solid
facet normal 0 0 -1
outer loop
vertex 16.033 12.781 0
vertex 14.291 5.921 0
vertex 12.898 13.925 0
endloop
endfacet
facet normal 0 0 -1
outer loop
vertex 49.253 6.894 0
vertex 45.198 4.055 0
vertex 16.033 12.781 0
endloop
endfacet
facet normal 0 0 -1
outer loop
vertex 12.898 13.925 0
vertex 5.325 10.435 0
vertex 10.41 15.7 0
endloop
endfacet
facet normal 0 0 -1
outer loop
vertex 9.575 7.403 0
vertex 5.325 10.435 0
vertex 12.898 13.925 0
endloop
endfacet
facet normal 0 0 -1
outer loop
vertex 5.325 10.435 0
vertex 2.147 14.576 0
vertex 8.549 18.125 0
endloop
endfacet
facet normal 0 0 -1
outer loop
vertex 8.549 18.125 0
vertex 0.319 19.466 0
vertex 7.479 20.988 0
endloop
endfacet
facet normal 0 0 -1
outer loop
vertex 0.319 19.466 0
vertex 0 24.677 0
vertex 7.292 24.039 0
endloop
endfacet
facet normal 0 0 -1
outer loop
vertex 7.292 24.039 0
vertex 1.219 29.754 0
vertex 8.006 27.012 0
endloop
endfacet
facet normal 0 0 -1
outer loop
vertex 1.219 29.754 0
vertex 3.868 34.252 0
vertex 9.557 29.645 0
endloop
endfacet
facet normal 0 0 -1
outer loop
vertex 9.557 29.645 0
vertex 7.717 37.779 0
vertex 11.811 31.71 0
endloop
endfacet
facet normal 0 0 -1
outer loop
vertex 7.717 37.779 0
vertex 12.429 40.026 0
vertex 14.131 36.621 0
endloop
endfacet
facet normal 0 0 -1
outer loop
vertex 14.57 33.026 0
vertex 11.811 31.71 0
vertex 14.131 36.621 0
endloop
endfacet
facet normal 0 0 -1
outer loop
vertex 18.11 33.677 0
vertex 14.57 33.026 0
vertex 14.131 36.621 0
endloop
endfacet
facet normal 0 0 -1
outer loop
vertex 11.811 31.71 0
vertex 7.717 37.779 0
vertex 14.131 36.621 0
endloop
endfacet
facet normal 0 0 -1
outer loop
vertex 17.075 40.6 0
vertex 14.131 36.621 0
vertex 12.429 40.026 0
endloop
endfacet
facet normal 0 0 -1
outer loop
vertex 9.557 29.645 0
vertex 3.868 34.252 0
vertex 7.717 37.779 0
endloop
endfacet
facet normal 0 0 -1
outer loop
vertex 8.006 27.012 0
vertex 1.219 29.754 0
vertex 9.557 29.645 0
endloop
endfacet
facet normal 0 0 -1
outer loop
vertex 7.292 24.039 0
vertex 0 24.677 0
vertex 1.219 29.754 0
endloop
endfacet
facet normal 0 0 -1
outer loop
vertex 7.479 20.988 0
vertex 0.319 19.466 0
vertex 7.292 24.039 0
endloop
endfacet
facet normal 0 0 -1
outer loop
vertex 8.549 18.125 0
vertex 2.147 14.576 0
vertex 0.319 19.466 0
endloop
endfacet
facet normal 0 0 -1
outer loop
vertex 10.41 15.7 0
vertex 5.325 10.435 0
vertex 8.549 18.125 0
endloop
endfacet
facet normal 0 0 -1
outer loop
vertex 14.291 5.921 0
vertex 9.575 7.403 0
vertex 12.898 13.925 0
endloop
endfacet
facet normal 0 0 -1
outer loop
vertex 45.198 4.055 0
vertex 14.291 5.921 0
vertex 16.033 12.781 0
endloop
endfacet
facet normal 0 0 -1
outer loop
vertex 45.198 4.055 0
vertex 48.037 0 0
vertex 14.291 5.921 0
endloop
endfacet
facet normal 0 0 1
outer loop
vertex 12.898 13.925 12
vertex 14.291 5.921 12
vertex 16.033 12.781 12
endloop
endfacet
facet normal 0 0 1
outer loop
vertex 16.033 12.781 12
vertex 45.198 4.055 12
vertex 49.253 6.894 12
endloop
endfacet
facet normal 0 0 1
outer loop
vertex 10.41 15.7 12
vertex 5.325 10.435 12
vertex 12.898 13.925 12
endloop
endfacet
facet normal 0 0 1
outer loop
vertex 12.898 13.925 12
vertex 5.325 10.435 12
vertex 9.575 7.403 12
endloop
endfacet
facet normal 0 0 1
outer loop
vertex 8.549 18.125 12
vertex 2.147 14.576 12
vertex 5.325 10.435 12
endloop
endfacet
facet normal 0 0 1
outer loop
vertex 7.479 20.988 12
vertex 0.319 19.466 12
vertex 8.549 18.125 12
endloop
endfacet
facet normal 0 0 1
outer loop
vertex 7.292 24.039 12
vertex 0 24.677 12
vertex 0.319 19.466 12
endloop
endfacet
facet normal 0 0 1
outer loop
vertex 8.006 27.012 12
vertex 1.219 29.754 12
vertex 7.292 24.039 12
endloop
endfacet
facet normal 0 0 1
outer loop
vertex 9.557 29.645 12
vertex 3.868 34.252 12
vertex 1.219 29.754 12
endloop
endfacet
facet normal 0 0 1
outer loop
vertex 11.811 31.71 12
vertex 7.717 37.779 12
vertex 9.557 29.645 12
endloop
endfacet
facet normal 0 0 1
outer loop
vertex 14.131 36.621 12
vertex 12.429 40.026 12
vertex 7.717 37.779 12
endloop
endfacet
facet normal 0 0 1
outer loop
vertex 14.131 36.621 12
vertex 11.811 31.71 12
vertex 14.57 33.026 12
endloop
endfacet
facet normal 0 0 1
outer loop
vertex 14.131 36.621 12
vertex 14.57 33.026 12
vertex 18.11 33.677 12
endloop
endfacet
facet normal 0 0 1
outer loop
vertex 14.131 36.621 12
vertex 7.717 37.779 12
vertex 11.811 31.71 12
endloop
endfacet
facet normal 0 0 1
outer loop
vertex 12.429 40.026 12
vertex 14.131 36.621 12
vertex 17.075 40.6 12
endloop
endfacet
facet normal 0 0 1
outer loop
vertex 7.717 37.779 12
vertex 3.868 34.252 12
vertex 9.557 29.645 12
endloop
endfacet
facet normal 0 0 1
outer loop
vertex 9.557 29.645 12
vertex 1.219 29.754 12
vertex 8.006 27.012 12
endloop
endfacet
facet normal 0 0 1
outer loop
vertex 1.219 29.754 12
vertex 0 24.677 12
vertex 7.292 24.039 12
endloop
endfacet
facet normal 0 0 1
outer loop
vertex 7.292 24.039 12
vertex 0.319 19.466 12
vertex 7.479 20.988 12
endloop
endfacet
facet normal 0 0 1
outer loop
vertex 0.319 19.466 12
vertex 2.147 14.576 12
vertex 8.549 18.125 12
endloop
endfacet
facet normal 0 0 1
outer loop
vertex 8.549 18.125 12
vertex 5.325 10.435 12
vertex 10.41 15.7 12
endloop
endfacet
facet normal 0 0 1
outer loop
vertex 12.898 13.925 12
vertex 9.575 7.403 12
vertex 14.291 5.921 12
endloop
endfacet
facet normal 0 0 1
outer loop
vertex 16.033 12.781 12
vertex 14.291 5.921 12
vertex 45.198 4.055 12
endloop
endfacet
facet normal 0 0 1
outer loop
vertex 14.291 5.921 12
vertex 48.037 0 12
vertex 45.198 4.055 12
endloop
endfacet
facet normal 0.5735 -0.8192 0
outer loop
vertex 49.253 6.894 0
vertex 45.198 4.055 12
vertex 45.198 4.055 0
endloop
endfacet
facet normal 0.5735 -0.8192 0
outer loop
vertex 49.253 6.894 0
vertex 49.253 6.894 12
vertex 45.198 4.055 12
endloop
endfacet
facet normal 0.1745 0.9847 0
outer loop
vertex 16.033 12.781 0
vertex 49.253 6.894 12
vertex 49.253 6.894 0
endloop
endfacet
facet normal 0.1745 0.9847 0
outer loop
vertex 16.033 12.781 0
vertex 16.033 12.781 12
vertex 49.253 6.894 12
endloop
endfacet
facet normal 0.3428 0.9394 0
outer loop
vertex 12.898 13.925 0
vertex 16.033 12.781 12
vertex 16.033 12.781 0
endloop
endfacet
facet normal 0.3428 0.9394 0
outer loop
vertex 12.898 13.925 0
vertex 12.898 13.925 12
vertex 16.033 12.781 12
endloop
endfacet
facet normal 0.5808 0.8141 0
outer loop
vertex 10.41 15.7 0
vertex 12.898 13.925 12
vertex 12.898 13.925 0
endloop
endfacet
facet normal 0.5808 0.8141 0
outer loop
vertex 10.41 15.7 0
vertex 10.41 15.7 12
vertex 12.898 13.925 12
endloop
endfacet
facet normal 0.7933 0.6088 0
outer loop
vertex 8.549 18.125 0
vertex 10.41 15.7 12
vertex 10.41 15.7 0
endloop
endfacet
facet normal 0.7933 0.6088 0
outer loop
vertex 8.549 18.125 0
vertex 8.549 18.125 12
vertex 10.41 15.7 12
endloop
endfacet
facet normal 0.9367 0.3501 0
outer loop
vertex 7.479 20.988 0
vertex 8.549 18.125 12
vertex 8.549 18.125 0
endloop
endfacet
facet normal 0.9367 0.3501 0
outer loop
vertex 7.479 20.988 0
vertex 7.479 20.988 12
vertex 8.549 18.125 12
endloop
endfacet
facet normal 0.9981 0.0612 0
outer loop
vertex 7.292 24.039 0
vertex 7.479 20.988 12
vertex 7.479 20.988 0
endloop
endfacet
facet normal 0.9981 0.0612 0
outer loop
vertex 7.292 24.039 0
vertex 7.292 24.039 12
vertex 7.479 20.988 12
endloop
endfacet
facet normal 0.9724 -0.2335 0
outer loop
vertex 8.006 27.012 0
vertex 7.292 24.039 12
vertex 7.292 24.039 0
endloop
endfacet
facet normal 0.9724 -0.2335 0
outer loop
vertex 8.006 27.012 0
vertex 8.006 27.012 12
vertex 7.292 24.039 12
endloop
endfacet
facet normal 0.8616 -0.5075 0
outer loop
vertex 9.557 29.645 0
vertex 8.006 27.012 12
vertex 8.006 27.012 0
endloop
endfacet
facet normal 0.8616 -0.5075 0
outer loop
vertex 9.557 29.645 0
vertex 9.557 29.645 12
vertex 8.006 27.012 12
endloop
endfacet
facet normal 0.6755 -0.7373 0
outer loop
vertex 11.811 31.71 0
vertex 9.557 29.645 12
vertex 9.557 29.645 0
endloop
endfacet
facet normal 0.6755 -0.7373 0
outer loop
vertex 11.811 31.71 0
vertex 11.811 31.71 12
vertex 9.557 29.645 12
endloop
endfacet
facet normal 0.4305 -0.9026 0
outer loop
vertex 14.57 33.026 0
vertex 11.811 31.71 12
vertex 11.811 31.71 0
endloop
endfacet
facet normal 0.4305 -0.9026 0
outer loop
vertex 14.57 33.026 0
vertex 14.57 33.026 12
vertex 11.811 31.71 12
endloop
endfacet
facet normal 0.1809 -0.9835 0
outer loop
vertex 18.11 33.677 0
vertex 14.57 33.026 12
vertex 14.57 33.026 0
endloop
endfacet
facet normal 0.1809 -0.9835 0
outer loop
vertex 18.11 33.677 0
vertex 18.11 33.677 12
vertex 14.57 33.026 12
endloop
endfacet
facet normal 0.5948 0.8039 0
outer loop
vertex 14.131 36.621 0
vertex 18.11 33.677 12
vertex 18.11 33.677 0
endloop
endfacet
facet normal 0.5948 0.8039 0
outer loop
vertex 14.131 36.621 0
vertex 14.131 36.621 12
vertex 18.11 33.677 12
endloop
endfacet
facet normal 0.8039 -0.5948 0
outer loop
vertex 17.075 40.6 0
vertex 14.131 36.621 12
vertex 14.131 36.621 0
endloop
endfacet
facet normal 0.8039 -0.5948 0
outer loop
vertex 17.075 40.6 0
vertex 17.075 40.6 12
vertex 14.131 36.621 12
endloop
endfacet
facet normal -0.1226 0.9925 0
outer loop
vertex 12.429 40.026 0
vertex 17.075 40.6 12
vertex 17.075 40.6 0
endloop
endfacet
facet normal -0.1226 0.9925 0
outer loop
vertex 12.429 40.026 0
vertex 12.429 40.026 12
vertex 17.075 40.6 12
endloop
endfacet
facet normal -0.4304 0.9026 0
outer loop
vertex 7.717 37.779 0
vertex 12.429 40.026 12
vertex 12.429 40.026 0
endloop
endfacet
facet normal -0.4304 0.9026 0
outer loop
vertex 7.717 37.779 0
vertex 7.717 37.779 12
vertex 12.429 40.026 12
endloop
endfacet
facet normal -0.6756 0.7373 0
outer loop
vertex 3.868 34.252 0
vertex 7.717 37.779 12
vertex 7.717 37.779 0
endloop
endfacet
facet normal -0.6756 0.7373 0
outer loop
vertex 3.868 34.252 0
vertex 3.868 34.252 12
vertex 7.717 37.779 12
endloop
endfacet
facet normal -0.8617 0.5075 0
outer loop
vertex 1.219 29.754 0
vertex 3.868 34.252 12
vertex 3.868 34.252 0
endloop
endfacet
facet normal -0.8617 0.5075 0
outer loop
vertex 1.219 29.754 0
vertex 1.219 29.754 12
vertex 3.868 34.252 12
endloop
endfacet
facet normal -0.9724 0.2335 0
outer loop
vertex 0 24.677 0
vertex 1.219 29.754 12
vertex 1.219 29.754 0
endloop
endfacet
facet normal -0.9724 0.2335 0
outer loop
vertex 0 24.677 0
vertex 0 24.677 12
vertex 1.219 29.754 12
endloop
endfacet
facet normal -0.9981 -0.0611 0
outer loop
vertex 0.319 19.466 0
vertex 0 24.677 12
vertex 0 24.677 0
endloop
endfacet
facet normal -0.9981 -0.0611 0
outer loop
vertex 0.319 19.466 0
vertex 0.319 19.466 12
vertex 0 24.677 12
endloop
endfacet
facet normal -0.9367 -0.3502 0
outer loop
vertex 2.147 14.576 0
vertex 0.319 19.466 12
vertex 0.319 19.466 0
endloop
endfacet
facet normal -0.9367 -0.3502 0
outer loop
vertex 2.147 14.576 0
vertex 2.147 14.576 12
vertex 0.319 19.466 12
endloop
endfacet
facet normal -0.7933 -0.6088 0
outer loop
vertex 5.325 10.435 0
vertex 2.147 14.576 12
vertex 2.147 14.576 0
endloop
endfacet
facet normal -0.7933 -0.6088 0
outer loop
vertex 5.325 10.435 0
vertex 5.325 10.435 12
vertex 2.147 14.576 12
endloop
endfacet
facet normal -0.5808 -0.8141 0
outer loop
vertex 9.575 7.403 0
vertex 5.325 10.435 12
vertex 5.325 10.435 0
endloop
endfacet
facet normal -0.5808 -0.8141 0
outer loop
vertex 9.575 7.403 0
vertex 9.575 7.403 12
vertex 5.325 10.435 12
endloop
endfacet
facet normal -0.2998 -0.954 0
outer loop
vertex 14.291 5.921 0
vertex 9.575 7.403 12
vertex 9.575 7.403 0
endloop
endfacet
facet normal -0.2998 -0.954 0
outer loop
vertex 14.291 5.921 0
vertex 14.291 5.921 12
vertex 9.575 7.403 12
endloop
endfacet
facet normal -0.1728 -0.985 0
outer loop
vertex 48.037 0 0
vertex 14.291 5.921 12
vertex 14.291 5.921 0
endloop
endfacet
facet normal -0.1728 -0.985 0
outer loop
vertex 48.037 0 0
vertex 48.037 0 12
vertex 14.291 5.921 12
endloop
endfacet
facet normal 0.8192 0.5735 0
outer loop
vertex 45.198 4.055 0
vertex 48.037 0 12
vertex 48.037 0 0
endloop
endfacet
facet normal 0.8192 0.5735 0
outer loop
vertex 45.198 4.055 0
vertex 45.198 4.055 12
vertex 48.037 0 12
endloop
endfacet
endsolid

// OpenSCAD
$fn = 32;

// ----------------------------------------------------------------------
// Hook plate: curl radius 14 mm over 170 degrees, 7 mm thick band
// ----------------------------------------------------------------------

// --- parameters (mm) ---
profile_height = 12;      // extrusion height
profile_points = 26;      // points of the closed outline

profile = [[14.131, 36.621], [17.075, 40.6], [12.429, 40.026], [7.717, 37.779], [3.868, 34.252], [1.219, 29.754], [0, 24.677], [0.319, 19.466], [2.147, 14.576], [5.325, 10.435], [9.575, 7.403], [14.291, 5.921], [48.037, 0], [45.198, 4.055], [49.253, 6.894], [16.033, 12.781], [12.898, 13.925], [10.41, 15.7], [8.549, 18.125], [7.479, 20.988], [7.292, 24.039], [8.006, 27.012], [9.557, 29.645], [11.811, 31.71], [14.57, 33.026], [18.11, 33.677]];  // single closed polygon, 26 points, counter clockwise

// --- the one profile operation ---
linear_extrude(height = profile_height) polygon(points = profile);
